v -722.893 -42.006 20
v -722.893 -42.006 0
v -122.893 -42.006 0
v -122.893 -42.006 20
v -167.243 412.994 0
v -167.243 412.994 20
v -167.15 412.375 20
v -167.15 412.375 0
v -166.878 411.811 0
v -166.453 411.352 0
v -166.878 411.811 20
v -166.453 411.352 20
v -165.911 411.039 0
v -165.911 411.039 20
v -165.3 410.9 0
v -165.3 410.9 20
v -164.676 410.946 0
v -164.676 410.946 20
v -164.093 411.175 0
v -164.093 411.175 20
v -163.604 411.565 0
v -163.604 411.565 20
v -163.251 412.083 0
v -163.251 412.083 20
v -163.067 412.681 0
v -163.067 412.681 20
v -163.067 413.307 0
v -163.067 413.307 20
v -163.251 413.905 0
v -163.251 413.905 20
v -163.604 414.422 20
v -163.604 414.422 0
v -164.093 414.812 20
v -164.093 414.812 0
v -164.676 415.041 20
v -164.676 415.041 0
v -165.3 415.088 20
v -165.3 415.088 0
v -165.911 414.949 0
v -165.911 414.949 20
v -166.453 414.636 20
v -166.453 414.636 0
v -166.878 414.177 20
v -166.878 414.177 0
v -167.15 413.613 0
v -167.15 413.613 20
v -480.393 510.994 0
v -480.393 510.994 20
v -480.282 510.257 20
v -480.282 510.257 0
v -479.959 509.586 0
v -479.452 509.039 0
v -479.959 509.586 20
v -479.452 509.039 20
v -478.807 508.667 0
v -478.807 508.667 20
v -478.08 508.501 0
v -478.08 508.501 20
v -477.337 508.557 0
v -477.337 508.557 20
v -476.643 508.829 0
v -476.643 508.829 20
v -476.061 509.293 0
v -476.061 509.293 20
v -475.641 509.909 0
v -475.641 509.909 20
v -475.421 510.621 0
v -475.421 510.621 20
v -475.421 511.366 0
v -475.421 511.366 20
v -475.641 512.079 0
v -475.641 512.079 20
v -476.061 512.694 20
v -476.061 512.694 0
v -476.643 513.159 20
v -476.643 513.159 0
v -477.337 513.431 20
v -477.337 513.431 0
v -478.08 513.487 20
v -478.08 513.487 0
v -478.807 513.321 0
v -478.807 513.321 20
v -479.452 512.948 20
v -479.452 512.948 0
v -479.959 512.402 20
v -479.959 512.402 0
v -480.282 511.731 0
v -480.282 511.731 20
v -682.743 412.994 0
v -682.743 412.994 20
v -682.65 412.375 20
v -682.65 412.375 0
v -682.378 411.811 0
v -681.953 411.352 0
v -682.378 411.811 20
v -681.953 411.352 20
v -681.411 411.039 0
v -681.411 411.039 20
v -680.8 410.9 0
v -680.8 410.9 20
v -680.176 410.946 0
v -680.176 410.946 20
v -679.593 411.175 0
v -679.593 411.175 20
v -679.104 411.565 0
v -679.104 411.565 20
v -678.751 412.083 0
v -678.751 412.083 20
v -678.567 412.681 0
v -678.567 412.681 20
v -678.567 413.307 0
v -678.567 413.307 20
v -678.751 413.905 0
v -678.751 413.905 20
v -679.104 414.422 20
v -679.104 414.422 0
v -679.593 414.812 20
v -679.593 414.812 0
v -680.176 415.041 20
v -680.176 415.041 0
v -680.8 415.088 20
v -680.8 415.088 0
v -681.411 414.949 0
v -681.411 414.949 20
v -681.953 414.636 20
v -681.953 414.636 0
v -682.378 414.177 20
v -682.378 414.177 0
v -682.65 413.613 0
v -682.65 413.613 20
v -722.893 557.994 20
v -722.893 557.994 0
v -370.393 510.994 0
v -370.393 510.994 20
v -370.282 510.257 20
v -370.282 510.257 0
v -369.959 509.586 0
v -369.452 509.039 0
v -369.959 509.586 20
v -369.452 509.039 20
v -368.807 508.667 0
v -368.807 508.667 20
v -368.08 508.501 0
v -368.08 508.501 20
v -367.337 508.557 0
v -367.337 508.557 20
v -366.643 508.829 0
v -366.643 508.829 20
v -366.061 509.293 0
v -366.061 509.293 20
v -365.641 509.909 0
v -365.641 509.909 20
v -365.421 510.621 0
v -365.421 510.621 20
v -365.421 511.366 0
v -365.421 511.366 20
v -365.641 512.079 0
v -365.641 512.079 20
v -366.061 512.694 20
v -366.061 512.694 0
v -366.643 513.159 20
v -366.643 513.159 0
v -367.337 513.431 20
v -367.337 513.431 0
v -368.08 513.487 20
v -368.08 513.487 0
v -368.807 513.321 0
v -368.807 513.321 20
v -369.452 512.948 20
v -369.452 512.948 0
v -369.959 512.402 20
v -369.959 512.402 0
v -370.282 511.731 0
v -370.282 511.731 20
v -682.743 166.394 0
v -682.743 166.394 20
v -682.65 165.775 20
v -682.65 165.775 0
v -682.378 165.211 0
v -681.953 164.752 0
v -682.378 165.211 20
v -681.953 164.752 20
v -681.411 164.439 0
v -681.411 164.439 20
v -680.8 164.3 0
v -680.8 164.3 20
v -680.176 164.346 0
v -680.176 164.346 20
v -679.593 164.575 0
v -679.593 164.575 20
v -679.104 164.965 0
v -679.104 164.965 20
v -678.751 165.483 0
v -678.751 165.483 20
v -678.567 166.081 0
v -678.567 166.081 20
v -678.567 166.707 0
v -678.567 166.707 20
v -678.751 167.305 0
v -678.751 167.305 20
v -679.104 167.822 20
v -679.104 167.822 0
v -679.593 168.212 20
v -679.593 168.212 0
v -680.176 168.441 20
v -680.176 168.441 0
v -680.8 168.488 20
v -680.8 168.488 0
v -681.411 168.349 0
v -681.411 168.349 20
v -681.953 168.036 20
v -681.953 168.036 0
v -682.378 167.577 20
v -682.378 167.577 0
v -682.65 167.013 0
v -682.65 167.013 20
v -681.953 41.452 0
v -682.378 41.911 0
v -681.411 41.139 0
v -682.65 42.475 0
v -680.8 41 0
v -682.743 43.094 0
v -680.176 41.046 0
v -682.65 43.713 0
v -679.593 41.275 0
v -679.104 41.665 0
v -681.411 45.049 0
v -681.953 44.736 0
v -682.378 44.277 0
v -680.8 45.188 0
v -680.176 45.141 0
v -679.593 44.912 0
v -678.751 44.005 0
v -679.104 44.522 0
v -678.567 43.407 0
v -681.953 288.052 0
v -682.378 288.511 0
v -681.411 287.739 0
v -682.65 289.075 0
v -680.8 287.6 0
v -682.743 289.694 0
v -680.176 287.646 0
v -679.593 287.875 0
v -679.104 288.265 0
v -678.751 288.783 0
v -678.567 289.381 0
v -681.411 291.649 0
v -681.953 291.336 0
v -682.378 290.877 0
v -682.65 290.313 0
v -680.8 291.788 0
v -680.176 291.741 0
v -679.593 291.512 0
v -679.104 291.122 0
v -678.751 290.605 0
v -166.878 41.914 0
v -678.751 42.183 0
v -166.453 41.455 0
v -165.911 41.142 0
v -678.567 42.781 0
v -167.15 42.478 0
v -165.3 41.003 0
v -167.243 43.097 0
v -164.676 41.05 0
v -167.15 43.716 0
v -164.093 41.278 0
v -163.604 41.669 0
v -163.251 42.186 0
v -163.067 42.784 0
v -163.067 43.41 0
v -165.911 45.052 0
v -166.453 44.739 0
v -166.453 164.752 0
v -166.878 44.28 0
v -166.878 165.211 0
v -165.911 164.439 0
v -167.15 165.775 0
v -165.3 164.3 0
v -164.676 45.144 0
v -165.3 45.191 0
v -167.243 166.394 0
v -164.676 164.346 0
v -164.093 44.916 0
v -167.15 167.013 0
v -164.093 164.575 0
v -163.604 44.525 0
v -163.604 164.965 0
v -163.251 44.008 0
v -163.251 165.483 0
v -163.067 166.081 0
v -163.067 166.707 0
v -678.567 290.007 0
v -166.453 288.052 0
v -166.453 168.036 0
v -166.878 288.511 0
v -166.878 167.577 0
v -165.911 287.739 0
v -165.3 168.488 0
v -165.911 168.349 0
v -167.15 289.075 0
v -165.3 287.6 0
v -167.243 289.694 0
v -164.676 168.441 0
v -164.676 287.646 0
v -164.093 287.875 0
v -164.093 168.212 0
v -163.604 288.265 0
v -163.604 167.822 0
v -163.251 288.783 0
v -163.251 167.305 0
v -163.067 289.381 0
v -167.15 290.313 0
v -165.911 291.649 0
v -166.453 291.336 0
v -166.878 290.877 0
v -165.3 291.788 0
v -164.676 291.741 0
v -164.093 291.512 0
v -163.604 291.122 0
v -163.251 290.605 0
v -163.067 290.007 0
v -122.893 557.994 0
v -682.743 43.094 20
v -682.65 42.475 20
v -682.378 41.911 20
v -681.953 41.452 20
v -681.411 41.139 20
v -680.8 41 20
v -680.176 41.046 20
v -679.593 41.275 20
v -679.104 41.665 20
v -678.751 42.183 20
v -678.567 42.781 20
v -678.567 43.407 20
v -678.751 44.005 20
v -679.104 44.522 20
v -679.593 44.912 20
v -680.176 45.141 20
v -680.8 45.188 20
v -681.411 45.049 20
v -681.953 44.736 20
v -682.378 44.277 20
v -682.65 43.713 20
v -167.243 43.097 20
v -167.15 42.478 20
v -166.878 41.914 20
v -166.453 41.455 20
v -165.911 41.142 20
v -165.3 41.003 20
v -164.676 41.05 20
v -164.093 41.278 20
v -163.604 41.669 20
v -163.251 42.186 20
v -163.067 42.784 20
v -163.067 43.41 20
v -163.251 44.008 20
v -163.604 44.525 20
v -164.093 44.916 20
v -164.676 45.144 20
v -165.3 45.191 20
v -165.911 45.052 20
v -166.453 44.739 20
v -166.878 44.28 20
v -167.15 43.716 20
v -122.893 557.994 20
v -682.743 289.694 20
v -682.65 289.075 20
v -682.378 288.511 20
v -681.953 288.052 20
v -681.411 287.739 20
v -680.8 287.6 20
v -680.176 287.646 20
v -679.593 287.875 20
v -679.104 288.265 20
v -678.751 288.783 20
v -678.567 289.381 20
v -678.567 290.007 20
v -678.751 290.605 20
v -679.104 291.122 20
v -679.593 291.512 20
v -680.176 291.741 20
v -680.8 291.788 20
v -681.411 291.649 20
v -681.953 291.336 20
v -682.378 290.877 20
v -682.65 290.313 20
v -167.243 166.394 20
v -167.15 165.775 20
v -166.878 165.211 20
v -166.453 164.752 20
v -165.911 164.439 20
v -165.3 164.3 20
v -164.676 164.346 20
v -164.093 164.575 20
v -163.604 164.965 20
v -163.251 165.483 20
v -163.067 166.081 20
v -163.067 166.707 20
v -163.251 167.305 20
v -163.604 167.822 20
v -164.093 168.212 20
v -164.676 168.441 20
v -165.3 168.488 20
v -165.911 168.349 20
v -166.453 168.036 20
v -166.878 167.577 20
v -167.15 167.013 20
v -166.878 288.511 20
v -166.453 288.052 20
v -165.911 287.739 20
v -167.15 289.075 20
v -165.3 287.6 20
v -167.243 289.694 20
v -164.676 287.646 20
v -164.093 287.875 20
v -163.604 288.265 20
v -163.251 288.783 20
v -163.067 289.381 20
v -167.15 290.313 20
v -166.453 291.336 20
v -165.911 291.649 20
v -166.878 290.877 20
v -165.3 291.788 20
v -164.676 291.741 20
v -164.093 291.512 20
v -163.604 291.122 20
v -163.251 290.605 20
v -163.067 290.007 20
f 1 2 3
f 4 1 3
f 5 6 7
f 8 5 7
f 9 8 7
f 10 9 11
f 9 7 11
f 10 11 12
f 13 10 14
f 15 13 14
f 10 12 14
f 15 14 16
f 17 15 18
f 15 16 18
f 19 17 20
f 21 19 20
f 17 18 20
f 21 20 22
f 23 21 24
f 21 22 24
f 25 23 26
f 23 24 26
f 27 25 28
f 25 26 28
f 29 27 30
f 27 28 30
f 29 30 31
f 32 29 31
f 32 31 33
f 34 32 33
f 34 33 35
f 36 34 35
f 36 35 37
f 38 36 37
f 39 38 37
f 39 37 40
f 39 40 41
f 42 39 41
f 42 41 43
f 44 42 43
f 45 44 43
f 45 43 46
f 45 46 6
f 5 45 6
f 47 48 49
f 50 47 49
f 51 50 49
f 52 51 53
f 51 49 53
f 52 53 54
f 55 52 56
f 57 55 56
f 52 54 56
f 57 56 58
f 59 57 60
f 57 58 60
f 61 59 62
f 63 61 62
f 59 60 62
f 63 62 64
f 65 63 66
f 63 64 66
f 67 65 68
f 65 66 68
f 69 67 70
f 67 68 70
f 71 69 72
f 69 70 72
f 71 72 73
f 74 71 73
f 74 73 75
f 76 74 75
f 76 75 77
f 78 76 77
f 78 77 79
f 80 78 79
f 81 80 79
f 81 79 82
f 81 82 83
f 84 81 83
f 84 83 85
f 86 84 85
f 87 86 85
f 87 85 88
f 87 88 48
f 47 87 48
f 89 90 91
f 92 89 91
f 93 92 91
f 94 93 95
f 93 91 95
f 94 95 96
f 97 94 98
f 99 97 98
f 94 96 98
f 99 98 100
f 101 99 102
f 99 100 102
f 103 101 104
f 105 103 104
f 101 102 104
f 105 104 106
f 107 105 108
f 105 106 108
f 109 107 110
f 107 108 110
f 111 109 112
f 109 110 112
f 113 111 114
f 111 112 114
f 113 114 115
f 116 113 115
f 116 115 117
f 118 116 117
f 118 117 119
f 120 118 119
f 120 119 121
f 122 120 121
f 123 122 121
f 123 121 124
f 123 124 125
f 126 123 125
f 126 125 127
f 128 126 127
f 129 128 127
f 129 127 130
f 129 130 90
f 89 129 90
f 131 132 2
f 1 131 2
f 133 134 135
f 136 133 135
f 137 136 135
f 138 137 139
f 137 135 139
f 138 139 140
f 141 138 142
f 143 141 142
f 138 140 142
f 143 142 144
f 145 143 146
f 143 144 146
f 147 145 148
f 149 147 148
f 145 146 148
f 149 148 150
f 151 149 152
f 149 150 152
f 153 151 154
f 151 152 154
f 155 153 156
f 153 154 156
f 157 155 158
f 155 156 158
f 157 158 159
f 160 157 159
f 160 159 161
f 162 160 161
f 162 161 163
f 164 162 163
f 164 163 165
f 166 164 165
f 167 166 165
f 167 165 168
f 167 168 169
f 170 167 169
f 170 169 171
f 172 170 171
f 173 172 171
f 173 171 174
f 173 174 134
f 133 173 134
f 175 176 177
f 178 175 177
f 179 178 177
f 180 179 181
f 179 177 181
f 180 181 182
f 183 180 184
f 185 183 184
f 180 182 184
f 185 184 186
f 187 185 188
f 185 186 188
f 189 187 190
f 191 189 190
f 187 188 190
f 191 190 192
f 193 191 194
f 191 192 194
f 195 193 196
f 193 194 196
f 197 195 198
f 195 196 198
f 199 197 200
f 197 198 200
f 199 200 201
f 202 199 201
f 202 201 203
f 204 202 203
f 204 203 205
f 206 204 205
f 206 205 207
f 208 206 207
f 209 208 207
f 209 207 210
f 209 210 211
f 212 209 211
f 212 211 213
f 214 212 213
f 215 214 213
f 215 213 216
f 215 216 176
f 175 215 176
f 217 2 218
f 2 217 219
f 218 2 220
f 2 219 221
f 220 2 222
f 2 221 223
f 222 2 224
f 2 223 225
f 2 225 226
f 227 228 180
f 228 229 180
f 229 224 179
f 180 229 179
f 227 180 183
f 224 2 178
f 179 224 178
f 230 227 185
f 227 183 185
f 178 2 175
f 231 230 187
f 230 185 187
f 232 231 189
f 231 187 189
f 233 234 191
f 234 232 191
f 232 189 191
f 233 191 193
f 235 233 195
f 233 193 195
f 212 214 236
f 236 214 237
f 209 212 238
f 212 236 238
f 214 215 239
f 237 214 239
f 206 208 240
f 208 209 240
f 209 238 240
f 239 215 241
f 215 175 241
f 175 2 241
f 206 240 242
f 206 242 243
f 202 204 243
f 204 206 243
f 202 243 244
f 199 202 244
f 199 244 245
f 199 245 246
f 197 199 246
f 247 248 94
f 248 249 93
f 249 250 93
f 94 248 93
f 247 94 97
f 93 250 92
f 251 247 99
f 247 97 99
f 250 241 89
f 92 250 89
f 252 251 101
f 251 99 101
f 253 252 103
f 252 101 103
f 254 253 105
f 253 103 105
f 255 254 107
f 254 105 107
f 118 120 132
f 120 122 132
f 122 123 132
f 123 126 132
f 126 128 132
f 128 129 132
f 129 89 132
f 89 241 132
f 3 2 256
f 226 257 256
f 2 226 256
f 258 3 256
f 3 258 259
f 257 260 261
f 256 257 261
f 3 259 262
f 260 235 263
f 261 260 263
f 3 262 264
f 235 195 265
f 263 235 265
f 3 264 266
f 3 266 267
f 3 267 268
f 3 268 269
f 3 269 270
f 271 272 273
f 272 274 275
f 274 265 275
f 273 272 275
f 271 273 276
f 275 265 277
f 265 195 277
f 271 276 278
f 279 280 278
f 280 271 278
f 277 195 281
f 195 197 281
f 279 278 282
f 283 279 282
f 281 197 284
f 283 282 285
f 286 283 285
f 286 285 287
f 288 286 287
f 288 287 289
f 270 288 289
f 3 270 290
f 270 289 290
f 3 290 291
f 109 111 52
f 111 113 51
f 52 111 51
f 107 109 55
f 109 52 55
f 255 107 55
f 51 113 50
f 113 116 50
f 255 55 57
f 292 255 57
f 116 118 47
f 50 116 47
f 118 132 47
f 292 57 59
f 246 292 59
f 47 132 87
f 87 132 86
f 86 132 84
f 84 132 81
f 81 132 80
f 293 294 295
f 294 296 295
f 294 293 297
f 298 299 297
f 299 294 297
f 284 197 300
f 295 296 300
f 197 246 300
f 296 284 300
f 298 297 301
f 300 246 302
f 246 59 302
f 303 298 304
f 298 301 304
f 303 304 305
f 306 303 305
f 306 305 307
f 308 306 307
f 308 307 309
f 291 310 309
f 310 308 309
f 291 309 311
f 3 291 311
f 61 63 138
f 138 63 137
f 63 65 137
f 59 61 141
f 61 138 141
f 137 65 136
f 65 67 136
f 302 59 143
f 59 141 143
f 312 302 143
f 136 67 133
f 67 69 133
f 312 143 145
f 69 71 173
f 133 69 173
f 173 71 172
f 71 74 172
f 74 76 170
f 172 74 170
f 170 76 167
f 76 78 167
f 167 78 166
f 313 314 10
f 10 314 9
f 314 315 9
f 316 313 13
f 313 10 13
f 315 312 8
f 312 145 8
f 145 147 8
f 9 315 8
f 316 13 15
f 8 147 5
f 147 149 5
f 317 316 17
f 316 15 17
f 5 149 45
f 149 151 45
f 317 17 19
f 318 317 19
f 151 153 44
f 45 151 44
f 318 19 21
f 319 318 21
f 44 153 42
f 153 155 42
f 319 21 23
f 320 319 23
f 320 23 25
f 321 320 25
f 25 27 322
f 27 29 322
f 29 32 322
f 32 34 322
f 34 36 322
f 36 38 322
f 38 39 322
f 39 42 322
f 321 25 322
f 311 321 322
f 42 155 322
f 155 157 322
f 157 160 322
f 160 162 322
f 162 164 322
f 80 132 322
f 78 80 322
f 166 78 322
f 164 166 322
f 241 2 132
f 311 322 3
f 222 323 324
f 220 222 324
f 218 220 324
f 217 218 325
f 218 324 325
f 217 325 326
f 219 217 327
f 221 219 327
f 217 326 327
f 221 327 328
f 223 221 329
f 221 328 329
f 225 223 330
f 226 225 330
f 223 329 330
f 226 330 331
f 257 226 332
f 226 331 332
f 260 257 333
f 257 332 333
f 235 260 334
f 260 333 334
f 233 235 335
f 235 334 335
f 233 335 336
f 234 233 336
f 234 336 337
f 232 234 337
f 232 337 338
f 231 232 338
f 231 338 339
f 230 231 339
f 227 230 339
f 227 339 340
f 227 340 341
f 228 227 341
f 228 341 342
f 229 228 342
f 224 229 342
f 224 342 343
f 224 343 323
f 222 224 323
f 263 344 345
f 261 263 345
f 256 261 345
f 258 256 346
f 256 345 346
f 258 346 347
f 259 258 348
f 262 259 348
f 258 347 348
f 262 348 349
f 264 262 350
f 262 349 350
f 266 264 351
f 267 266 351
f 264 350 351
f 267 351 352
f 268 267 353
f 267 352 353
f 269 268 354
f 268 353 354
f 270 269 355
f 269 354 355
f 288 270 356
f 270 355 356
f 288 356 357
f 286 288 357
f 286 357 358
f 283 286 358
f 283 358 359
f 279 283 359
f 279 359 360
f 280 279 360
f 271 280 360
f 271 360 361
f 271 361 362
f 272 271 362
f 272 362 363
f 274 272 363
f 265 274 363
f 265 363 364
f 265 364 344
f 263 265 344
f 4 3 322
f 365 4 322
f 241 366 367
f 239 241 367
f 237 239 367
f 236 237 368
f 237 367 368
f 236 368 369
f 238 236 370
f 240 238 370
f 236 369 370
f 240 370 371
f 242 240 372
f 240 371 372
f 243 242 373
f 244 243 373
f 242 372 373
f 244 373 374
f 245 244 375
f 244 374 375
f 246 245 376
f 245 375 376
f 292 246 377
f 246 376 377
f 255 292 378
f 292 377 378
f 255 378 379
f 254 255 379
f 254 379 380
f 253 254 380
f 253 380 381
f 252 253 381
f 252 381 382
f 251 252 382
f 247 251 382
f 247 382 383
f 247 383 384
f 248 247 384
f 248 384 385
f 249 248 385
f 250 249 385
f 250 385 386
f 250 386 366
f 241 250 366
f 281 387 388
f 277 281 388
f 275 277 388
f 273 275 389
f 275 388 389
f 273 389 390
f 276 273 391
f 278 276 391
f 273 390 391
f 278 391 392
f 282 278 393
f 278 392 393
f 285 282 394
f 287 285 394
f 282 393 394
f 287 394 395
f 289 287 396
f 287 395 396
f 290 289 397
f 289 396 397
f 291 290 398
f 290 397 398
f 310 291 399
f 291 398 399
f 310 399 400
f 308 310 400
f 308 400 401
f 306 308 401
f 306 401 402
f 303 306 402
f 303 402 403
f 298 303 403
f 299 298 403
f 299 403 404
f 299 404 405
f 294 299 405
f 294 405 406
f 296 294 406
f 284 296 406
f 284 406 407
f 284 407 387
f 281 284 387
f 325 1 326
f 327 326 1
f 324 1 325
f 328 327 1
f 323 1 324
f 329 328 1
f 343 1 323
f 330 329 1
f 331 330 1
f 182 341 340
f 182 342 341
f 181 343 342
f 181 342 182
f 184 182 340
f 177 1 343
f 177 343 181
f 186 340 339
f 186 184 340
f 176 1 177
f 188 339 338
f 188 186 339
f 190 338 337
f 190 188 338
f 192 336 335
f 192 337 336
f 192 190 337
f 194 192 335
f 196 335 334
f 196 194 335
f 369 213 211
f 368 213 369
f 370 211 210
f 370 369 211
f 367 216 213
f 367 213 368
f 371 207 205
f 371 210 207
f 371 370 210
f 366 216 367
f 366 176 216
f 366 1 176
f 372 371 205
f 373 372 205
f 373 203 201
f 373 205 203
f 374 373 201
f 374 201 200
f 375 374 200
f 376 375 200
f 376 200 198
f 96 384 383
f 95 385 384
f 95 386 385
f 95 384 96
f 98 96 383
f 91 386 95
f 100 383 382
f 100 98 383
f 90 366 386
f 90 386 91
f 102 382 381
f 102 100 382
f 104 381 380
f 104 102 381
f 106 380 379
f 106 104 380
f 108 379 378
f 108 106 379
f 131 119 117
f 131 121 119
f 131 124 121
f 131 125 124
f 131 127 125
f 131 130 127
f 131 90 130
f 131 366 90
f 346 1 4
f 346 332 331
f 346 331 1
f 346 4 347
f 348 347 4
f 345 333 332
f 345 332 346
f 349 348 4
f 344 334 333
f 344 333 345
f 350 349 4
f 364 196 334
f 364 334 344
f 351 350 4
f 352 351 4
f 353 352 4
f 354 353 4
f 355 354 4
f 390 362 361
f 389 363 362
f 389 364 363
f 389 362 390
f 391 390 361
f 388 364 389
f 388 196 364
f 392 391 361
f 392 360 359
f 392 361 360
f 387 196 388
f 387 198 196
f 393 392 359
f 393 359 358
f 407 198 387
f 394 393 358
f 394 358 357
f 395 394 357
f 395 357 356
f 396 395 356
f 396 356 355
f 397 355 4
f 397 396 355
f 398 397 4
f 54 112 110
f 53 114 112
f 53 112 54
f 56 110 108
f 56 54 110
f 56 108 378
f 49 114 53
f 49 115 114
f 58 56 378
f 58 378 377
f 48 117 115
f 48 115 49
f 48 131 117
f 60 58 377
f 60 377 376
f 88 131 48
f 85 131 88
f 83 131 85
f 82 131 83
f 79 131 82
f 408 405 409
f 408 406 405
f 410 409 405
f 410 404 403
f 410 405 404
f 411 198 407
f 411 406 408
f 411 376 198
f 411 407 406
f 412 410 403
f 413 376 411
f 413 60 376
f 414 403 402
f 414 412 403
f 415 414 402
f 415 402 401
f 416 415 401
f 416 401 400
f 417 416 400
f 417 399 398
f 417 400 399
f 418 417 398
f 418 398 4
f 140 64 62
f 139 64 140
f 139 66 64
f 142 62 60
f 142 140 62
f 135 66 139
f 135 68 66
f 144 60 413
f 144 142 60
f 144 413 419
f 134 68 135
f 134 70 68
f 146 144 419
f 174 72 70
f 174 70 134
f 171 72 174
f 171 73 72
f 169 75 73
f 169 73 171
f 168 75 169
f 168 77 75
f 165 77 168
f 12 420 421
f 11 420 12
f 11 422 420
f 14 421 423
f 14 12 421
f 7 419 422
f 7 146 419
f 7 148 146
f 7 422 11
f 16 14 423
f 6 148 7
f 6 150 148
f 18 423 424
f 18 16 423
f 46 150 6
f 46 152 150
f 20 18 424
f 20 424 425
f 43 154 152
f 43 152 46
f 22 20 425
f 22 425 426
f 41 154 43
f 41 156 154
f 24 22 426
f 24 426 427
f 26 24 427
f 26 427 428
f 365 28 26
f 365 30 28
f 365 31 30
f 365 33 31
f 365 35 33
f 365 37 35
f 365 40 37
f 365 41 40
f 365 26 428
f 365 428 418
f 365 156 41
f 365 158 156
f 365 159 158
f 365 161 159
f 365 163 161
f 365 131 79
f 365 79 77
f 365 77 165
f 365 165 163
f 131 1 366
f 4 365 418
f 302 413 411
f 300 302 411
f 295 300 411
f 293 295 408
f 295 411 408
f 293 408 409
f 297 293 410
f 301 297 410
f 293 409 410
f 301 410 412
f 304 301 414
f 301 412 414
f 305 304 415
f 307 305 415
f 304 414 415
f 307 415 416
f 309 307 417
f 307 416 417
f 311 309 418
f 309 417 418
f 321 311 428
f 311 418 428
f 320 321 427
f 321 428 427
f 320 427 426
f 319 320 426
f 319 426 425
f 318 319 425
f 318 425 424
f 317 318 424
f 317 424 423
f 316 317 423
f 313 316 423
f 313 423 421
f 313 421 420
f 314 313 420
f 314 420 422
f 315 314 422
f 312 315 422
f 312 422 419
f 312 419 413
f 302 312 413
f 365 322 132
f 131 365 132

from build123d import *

# Parameters (mm, degrees)
F1_DEPTH = 20
F2_D     = 5
F3_D     = 4.2


with BuildPart() as f1:
    # F0 (on Top) → F1 (new body)
    with BuildSketch(Plane.XY):
        Polygon((-122.8932932019, 557.9938352108), (-722.8932932019, 557.9938352108), (-722.8932932019, -42.0061647892), (-422.8932932019, -42.0061647892), (-122.8932932019, -42.0061647892), align=None)
    extrude(amount=F1_DEPTH)

    # F2 (through all)
    with Locations(Plane(origin=(0, 0, 0), x_dir=(1, 0, 0), z_dir=(0, 0, -1))):
        with Locations((-477.8932932019, -510.9938352108), (-367.8932932019, -510.9938352108)):
            Hole(F2_D / 2)

    # F3 (through all)
    with Locations(Plane(origin=(0, 0, 0), x_dir=(1, 0, 0), z_dir=(0, 0, -1))):
        with Locations((-680.6432932019, -412.9938352108), (-680.6432932019, -289.6938352108), (-680.6432932019, -166.3938352108), (-680.6432932019, -43.0938352108), (-165.1432932019, -43.0969782174), (-165.1432932019, -166.3938352108), (-165.1432932019, -289.6938352108), (-165.1432932019, -412.9938352108)):
            Hole(F3_D / 2)


solid = f1.part
